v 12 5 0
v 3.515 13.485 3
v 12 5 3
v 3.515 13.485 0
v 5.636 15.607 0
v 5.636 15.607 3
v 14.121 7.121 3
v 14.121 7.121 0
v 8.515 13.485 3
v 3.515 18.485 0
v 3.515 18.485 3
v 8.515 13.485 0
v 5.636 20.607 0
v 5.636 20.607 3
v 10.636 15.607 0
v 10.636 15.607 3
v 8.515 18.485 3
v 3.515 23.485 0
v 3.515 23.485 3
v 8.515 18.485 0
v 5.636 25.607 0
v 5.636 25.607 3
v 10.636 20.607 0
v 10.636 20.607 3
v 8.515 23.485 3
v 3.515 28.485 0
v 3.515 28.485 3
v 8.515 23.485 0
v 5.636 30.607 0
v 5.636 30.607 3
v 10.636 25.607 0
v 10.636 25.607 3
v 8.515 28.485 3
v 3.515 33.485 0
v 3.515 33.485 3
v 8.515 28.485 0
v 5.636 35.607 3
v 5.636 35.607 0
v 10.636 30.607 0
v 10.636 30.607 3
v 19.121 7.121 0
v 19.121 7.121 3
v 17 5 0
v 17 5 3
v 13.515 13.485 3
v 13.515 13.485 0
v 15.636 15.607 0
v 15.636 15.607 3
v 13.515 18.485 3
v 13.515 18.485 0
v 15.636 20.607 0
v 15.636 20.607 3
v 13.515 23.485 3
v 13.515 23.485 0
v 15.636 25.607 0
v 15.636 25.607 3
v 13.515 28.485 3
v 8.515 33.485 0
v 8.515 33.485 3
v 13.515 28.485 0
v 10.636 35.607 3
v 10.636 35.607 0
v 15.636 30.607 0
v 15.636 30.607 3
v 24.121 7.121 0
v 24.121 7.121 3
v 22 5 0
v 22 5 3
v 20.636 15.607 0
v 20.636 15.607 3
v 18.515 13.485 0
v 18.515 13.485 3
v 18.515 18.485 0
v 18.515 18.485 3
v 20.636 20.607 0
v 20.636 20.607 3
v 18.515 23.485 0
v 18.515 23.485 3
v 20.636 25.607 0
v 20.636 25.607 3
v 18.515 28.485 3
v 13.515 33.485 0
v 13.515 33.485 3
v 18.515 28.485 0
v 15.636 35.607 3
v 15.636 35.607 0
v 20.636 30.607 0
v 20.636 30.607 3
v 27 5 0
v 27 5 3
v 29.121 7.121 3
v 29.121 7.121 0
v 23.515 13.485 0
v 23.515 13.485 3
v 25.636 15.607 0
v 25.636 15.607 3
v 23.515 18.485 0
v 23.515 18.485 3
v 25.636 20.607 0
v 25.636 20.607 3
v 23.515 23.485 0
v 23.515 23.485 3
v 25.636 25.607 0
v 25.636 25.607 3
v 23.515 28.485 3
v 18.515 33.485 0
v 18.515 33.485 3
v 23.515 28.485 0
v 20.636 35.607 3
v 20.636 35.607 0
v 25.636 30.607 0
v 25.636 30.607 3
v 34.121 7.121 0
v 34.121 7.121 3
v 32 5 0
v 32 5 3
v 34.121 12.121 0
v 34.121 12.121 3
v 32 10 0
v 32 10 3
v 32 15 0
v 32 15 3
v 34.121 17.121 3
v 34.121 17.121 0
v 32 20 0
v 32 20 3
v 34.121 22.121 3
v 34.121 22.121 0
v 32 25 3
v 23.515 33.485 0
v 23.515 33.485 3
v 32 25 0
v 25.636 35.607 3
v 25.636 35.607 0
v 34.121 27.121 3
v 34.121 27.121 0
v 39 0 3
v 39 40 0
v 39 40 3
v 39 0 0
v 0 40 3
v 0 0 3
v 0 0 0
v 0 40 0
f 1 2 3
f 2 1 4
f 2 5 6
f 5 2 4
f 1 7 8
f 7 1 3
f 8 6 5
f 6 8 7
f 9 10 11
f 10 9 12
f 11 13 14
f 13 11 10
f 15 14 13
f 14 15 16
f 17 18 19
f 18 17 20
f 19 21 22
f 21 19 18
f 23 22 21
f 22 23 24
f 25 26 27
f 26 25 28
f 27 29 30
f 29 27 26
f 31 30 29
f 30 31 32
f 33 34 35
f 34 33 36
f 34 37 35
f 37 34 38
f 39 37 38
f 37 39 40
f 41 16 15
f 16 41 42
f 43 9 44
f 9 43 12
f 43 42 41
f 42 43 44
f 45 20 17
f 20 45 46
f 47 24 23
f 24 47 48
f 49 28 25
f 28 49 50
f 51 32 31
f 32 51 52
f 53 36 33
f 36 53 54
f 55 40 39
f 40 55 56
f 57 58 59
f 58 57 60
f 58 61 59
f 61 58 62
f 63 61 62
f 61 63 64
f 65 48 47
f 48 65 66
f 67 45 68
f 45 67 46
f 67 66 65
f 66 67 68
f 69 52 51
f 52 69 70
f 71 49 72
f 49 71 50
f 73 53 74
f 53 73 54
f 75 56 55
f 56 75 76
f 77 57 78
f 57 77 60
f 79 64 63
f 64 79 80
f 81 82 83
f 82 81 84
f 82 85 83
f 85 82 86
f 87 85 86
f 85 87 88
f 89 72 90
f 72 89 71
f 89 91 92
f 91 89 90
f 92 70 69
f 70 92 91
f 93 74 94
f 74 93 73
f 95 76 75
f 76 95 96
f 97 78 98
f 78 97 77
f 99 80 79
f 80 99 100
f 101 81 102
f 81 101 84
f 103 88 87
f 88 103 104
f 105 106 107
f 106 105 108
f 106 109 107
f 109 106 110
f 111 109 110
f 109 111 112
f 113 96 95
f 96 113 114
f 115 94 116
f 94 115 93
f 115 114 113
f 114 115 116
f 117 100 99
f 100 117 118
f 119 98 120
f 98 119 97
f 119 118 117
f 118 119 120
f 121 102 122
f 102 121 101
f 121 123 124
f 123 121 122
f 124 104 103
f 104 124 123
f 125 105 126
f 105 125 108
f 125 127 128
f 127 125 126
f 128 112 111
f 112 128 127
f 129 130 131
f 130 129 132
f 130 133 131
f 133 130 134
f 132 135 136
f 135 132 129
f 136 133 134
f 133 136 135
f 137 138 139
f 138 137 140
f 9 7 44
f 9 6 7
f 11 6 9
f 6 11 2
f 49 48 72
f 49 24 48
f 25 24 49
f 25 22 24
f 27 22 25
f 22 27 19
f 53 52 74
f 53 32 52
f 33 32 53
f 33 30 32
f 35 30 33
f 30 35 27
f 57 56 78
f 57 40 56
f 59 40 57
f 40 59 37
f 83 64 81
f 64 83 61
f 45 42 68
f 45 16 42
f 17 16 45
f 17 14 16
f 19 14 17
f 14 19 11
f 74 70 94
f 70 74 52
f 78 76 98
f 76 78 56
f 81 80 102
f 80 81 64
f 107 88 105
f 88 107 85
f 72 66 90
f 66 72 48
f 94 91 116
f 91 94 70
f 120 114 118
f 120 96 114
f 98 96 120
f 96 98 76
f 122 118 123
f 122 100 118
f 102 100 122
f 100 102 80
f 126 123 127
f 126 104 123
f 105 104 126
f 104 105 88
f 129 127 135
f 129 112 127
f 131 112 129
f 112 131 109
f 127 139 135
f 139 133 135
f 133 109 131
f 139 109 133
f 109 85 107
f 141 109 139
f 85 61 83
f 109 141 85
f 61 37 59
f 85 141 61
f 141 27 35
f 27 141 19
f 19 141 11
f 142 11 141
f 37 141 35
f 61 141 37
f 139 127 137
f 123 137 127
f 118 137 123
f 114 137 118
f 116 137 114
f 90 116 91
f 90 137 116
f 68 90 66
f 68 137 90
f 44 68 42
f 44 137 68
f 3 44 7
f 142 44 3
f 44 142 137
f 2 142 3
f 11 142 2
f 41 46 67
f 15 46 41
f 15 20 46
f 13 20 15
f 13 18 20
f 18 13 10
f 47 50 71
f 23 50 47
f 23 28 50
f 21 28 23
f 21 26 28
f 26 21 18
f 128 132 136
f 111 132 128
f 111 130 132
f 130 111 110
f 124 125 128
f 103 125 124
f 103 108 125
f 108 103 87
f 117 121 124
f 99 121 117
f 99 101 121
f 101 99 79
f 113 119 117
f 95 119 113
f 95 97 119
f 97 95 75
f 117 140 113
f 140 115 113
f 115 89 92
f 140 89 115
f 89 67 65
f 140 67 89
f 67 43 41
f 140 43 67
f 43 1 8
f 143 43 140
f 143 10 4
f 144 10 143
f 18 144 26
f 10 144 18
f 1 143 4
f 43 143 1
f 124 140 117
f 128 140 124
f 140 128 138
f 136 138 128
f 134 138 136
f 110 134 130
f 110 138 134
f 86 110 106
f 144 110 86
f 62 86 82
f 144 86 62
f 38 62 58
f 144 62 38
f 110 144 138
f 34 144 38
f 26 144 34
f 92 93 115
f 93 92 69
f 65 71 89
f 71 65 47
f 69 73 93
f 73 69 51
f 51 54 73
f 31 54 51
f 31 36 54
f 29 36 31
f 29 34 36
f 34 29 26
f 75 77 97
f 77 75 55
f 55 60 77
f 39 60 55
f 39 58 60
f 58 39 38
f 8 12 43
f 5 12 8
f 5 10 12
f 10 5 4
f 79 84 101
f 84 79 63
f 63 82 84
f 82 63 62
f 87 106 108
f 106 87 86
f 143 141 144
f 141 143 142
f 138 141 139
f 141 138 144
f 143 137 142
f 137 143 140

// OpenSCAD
difference() {
    w = 39;
    d = 40;
    h = 3;
    
    wh = 3;
    wh_gap = 2;
    
    count = w / (wh + wh_gap) - 2;
    difference() {
        color("silver") cube([w, d, h]);
        
        for (i = [1:count])
       
        for(j = [1:count]) {
            translate([7 + i * (wh + wh_gap), 5 * j, -1])
            color("black")
            rotate([0,0,45])
            cube([wh,12,h + 2]);
        }
    }
    
}
